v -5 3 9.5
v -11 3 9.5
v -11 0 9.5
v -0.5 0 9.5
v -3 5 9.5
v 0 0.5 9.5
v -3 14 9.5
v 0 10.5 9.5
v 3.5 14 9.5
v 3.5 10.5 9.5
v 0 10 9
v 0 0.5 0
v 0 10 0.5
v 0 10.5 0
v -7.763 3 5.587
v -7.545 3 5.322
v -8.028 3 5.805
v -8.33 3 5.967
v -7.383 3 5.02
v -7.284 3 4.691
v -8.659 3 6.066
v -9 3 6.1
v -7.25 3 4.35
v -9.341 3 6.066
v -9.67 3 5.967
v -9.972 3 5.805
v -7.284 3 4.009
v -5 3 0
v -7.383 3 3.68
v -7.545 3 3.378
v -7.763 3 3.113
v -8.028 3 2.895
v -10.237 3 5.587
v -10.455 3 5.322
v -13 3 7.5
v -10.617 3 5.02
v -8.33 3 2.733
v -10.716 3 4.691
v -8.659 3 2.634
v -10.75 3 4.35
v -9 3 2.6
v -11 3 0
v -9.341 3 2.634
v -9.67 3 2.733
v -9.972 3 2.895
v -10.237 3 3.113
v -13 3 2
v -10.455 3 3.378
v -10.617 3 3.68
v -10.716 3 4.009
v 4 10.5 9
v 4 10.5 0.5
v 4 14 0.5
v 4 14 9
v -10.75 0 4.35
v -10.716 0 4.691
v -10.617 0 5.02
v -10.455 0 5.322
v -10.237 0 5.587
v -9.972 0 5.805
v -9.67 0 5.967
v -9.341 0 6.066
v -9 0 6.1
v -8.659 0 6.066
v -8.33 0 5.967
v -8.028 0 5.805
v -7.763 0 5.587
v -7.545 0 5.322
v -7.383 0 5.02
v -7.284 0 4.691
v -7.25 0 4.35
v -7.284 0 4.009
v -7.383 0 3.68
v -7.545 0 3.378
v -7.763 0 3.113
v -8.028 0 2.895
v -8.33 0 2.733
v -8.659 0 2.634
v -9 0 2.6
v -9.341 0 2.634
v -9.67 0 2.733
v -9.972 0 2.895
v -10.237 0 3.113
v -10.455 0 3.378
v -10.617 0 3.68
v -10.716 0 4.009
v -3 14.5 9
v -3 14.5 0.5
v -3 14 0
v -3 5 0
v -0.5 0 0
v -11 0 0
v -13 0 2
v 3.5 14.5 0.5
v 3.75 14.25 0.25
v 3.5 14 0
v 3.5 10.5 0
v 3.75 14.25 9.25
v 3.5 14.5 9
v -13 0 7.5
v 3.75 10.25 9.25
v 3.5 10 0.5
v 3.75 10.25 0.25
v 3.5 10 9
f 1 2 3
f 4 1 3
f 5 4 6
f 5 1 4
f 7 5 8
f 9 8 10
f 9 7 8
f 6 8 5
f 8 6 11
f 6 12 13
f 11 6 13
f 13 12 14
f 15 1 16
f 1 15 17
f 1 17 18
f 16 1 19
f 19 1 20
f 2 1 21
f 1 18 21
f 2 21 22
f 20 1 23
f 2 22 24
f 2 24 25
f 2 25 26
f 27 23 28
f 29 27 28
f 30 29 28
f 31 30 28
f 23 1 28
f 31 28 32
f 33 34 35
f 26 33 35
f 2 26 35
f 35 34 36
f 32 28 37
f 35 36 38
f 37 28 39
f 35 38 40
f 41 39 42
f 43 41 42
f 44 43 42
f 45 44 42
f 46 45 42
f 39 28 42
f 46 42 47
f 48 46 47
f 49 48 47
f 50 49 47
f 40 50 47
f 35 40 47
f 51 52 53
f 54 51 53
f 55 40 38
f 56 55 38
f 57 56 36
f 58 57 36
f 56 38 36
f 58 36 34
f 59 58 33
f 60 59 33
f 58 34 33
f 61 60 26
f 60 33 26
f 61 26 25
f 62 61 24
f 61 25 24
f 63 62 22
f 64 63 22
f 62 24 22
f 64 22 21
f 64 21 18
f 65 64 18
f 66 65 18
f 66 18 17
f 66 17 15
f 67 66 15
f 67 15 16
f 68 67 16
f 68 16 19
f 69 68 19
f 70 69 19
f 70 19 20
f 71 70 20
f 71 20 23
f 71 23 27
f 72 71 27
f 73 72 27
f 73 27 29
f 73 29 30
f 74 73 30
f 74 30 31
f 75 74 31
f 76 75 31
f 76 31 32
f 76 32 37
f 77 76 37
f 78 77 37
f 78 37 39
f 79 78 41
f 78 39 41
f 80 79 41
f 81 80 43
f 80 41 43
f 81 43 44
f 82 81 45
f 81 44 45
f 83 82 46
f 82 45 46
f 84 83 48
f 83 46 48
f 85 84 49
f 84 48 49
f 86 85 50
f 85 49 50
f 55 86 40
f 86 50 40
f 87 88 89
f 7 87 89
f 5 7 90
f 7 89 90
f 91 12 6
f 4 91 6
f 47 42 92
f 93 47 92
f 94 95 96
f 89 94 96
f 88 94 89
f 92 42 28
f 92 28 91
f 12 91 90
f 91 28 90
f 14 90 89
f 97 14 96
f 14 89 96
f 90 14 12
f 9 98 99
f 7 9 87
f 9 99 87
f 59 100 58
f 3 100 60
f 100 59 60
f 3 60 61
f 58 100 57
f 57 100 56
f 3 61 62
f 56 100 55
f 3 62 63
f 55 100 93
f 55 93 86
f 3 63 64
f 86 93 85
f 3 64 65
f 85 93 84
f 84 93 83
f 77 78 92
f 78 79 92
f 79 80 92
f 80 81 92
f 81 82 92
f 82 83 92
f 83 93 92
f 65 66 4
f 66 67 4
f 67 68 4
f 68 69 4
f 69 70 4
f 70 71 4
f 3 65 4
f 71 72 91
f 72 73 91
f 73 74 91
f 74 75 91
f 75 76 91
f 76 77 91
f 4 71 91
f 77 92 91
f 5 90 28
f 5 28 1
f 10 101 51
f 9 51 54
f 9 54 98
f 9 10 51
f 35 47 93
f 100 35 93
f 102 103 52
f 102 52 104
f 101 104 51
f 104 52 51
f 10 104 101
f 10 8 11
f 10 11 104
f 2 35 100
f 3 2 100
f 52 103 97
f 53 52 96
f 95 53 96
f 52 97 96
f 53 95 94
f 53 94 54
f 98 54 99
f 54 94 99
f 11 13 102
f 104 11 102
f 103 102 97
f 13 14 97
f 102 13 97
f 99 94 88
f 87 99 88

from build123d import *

# Parameters (mm, degrees)
PAD_DEPTH       = 9.5
CHAMFER_SIZE    = 0.5
CHAMFER001_SIZE = 0.5
CHAMFER002_SIZE = 2
CHAMFER003_SIZE = 0.5
CHAMFER004_SIZE = 2
SKETCH001_R     = 1.75
POCKET_DEPTH    = 5


with BuildPart() as part:
    # Sketch → Pad (new body)
    with BuildSketch(Plane.XY):
        Polygon((-13, 0), (0, 0), (0, 10), (4, 10), (4, 14.5), (-3, 14.5), (-3, 3), (-13, 3), align=None)
    extrude(amount=PAD_DEPTH)

    # Chamfer
    chamfer_edges = [part.edges().sort_by_distance(p)[0] for p in [
        (4, 10, 4.75),
        (4, 14.5, 4.75),
        (4, 12.25, 9.5),
        (4, 12.25, 0),
    ]]
    chamfer(chamfer_edges, length=CHAMFER_SIZE)

    # Chamfer001
    chamfer001_edges = [part.edges().sort_by_distance(p)[0] for p in [
        (1.75, 10, 0),
        (1.75, 10, 9.5),
        (0.25, 14.5, 9.5),
        (0.25, 14.5, 0),
    ]]
    chamfer(chamfer001_edges, length=CHAMFER001_SIZE)

    # Chamfer002
    chamfer002_edges = [part.edges().sort_by_distance(p)[0] for p in [
        (-3, 3, 4.75),
    ]]
    chamfer(chamfer002_edges, length=CHAMFER002_SIZE)

    # Chamfer003
    chamfer003_edges = [part.edges().sort_by_distance(p)[0] for p in [
        (0, 0, 4.75),
    ]]
    chamfer(chamfer003_edges, length=CHAMFER003_SIZE)

    # Chamfer004
    chamfer004_edges = [part.edges().sort_by_distance(p)[0] for p in [
        (-13, 1.5, 0),
        (-13, 1.5, 9.5),
    ]]
    chamfer(chamfer004_edges, length=CHAMFER004_SIZE)

    # Sketch001 (on Face5 of Chamfer004) → Pocket (cut)
    with BuildSketch(Plane(origin=(0, 3, 0), x_dir=(-1, 0, 0), z_dir=(0, 1, 0))):
        with Locations((9, 4.35)):
            Circle(SKETCH001_R)
    extrude(amount=-POCKET_DEPTH, mode=Mode.SUBTRACT)


solid = part.part
